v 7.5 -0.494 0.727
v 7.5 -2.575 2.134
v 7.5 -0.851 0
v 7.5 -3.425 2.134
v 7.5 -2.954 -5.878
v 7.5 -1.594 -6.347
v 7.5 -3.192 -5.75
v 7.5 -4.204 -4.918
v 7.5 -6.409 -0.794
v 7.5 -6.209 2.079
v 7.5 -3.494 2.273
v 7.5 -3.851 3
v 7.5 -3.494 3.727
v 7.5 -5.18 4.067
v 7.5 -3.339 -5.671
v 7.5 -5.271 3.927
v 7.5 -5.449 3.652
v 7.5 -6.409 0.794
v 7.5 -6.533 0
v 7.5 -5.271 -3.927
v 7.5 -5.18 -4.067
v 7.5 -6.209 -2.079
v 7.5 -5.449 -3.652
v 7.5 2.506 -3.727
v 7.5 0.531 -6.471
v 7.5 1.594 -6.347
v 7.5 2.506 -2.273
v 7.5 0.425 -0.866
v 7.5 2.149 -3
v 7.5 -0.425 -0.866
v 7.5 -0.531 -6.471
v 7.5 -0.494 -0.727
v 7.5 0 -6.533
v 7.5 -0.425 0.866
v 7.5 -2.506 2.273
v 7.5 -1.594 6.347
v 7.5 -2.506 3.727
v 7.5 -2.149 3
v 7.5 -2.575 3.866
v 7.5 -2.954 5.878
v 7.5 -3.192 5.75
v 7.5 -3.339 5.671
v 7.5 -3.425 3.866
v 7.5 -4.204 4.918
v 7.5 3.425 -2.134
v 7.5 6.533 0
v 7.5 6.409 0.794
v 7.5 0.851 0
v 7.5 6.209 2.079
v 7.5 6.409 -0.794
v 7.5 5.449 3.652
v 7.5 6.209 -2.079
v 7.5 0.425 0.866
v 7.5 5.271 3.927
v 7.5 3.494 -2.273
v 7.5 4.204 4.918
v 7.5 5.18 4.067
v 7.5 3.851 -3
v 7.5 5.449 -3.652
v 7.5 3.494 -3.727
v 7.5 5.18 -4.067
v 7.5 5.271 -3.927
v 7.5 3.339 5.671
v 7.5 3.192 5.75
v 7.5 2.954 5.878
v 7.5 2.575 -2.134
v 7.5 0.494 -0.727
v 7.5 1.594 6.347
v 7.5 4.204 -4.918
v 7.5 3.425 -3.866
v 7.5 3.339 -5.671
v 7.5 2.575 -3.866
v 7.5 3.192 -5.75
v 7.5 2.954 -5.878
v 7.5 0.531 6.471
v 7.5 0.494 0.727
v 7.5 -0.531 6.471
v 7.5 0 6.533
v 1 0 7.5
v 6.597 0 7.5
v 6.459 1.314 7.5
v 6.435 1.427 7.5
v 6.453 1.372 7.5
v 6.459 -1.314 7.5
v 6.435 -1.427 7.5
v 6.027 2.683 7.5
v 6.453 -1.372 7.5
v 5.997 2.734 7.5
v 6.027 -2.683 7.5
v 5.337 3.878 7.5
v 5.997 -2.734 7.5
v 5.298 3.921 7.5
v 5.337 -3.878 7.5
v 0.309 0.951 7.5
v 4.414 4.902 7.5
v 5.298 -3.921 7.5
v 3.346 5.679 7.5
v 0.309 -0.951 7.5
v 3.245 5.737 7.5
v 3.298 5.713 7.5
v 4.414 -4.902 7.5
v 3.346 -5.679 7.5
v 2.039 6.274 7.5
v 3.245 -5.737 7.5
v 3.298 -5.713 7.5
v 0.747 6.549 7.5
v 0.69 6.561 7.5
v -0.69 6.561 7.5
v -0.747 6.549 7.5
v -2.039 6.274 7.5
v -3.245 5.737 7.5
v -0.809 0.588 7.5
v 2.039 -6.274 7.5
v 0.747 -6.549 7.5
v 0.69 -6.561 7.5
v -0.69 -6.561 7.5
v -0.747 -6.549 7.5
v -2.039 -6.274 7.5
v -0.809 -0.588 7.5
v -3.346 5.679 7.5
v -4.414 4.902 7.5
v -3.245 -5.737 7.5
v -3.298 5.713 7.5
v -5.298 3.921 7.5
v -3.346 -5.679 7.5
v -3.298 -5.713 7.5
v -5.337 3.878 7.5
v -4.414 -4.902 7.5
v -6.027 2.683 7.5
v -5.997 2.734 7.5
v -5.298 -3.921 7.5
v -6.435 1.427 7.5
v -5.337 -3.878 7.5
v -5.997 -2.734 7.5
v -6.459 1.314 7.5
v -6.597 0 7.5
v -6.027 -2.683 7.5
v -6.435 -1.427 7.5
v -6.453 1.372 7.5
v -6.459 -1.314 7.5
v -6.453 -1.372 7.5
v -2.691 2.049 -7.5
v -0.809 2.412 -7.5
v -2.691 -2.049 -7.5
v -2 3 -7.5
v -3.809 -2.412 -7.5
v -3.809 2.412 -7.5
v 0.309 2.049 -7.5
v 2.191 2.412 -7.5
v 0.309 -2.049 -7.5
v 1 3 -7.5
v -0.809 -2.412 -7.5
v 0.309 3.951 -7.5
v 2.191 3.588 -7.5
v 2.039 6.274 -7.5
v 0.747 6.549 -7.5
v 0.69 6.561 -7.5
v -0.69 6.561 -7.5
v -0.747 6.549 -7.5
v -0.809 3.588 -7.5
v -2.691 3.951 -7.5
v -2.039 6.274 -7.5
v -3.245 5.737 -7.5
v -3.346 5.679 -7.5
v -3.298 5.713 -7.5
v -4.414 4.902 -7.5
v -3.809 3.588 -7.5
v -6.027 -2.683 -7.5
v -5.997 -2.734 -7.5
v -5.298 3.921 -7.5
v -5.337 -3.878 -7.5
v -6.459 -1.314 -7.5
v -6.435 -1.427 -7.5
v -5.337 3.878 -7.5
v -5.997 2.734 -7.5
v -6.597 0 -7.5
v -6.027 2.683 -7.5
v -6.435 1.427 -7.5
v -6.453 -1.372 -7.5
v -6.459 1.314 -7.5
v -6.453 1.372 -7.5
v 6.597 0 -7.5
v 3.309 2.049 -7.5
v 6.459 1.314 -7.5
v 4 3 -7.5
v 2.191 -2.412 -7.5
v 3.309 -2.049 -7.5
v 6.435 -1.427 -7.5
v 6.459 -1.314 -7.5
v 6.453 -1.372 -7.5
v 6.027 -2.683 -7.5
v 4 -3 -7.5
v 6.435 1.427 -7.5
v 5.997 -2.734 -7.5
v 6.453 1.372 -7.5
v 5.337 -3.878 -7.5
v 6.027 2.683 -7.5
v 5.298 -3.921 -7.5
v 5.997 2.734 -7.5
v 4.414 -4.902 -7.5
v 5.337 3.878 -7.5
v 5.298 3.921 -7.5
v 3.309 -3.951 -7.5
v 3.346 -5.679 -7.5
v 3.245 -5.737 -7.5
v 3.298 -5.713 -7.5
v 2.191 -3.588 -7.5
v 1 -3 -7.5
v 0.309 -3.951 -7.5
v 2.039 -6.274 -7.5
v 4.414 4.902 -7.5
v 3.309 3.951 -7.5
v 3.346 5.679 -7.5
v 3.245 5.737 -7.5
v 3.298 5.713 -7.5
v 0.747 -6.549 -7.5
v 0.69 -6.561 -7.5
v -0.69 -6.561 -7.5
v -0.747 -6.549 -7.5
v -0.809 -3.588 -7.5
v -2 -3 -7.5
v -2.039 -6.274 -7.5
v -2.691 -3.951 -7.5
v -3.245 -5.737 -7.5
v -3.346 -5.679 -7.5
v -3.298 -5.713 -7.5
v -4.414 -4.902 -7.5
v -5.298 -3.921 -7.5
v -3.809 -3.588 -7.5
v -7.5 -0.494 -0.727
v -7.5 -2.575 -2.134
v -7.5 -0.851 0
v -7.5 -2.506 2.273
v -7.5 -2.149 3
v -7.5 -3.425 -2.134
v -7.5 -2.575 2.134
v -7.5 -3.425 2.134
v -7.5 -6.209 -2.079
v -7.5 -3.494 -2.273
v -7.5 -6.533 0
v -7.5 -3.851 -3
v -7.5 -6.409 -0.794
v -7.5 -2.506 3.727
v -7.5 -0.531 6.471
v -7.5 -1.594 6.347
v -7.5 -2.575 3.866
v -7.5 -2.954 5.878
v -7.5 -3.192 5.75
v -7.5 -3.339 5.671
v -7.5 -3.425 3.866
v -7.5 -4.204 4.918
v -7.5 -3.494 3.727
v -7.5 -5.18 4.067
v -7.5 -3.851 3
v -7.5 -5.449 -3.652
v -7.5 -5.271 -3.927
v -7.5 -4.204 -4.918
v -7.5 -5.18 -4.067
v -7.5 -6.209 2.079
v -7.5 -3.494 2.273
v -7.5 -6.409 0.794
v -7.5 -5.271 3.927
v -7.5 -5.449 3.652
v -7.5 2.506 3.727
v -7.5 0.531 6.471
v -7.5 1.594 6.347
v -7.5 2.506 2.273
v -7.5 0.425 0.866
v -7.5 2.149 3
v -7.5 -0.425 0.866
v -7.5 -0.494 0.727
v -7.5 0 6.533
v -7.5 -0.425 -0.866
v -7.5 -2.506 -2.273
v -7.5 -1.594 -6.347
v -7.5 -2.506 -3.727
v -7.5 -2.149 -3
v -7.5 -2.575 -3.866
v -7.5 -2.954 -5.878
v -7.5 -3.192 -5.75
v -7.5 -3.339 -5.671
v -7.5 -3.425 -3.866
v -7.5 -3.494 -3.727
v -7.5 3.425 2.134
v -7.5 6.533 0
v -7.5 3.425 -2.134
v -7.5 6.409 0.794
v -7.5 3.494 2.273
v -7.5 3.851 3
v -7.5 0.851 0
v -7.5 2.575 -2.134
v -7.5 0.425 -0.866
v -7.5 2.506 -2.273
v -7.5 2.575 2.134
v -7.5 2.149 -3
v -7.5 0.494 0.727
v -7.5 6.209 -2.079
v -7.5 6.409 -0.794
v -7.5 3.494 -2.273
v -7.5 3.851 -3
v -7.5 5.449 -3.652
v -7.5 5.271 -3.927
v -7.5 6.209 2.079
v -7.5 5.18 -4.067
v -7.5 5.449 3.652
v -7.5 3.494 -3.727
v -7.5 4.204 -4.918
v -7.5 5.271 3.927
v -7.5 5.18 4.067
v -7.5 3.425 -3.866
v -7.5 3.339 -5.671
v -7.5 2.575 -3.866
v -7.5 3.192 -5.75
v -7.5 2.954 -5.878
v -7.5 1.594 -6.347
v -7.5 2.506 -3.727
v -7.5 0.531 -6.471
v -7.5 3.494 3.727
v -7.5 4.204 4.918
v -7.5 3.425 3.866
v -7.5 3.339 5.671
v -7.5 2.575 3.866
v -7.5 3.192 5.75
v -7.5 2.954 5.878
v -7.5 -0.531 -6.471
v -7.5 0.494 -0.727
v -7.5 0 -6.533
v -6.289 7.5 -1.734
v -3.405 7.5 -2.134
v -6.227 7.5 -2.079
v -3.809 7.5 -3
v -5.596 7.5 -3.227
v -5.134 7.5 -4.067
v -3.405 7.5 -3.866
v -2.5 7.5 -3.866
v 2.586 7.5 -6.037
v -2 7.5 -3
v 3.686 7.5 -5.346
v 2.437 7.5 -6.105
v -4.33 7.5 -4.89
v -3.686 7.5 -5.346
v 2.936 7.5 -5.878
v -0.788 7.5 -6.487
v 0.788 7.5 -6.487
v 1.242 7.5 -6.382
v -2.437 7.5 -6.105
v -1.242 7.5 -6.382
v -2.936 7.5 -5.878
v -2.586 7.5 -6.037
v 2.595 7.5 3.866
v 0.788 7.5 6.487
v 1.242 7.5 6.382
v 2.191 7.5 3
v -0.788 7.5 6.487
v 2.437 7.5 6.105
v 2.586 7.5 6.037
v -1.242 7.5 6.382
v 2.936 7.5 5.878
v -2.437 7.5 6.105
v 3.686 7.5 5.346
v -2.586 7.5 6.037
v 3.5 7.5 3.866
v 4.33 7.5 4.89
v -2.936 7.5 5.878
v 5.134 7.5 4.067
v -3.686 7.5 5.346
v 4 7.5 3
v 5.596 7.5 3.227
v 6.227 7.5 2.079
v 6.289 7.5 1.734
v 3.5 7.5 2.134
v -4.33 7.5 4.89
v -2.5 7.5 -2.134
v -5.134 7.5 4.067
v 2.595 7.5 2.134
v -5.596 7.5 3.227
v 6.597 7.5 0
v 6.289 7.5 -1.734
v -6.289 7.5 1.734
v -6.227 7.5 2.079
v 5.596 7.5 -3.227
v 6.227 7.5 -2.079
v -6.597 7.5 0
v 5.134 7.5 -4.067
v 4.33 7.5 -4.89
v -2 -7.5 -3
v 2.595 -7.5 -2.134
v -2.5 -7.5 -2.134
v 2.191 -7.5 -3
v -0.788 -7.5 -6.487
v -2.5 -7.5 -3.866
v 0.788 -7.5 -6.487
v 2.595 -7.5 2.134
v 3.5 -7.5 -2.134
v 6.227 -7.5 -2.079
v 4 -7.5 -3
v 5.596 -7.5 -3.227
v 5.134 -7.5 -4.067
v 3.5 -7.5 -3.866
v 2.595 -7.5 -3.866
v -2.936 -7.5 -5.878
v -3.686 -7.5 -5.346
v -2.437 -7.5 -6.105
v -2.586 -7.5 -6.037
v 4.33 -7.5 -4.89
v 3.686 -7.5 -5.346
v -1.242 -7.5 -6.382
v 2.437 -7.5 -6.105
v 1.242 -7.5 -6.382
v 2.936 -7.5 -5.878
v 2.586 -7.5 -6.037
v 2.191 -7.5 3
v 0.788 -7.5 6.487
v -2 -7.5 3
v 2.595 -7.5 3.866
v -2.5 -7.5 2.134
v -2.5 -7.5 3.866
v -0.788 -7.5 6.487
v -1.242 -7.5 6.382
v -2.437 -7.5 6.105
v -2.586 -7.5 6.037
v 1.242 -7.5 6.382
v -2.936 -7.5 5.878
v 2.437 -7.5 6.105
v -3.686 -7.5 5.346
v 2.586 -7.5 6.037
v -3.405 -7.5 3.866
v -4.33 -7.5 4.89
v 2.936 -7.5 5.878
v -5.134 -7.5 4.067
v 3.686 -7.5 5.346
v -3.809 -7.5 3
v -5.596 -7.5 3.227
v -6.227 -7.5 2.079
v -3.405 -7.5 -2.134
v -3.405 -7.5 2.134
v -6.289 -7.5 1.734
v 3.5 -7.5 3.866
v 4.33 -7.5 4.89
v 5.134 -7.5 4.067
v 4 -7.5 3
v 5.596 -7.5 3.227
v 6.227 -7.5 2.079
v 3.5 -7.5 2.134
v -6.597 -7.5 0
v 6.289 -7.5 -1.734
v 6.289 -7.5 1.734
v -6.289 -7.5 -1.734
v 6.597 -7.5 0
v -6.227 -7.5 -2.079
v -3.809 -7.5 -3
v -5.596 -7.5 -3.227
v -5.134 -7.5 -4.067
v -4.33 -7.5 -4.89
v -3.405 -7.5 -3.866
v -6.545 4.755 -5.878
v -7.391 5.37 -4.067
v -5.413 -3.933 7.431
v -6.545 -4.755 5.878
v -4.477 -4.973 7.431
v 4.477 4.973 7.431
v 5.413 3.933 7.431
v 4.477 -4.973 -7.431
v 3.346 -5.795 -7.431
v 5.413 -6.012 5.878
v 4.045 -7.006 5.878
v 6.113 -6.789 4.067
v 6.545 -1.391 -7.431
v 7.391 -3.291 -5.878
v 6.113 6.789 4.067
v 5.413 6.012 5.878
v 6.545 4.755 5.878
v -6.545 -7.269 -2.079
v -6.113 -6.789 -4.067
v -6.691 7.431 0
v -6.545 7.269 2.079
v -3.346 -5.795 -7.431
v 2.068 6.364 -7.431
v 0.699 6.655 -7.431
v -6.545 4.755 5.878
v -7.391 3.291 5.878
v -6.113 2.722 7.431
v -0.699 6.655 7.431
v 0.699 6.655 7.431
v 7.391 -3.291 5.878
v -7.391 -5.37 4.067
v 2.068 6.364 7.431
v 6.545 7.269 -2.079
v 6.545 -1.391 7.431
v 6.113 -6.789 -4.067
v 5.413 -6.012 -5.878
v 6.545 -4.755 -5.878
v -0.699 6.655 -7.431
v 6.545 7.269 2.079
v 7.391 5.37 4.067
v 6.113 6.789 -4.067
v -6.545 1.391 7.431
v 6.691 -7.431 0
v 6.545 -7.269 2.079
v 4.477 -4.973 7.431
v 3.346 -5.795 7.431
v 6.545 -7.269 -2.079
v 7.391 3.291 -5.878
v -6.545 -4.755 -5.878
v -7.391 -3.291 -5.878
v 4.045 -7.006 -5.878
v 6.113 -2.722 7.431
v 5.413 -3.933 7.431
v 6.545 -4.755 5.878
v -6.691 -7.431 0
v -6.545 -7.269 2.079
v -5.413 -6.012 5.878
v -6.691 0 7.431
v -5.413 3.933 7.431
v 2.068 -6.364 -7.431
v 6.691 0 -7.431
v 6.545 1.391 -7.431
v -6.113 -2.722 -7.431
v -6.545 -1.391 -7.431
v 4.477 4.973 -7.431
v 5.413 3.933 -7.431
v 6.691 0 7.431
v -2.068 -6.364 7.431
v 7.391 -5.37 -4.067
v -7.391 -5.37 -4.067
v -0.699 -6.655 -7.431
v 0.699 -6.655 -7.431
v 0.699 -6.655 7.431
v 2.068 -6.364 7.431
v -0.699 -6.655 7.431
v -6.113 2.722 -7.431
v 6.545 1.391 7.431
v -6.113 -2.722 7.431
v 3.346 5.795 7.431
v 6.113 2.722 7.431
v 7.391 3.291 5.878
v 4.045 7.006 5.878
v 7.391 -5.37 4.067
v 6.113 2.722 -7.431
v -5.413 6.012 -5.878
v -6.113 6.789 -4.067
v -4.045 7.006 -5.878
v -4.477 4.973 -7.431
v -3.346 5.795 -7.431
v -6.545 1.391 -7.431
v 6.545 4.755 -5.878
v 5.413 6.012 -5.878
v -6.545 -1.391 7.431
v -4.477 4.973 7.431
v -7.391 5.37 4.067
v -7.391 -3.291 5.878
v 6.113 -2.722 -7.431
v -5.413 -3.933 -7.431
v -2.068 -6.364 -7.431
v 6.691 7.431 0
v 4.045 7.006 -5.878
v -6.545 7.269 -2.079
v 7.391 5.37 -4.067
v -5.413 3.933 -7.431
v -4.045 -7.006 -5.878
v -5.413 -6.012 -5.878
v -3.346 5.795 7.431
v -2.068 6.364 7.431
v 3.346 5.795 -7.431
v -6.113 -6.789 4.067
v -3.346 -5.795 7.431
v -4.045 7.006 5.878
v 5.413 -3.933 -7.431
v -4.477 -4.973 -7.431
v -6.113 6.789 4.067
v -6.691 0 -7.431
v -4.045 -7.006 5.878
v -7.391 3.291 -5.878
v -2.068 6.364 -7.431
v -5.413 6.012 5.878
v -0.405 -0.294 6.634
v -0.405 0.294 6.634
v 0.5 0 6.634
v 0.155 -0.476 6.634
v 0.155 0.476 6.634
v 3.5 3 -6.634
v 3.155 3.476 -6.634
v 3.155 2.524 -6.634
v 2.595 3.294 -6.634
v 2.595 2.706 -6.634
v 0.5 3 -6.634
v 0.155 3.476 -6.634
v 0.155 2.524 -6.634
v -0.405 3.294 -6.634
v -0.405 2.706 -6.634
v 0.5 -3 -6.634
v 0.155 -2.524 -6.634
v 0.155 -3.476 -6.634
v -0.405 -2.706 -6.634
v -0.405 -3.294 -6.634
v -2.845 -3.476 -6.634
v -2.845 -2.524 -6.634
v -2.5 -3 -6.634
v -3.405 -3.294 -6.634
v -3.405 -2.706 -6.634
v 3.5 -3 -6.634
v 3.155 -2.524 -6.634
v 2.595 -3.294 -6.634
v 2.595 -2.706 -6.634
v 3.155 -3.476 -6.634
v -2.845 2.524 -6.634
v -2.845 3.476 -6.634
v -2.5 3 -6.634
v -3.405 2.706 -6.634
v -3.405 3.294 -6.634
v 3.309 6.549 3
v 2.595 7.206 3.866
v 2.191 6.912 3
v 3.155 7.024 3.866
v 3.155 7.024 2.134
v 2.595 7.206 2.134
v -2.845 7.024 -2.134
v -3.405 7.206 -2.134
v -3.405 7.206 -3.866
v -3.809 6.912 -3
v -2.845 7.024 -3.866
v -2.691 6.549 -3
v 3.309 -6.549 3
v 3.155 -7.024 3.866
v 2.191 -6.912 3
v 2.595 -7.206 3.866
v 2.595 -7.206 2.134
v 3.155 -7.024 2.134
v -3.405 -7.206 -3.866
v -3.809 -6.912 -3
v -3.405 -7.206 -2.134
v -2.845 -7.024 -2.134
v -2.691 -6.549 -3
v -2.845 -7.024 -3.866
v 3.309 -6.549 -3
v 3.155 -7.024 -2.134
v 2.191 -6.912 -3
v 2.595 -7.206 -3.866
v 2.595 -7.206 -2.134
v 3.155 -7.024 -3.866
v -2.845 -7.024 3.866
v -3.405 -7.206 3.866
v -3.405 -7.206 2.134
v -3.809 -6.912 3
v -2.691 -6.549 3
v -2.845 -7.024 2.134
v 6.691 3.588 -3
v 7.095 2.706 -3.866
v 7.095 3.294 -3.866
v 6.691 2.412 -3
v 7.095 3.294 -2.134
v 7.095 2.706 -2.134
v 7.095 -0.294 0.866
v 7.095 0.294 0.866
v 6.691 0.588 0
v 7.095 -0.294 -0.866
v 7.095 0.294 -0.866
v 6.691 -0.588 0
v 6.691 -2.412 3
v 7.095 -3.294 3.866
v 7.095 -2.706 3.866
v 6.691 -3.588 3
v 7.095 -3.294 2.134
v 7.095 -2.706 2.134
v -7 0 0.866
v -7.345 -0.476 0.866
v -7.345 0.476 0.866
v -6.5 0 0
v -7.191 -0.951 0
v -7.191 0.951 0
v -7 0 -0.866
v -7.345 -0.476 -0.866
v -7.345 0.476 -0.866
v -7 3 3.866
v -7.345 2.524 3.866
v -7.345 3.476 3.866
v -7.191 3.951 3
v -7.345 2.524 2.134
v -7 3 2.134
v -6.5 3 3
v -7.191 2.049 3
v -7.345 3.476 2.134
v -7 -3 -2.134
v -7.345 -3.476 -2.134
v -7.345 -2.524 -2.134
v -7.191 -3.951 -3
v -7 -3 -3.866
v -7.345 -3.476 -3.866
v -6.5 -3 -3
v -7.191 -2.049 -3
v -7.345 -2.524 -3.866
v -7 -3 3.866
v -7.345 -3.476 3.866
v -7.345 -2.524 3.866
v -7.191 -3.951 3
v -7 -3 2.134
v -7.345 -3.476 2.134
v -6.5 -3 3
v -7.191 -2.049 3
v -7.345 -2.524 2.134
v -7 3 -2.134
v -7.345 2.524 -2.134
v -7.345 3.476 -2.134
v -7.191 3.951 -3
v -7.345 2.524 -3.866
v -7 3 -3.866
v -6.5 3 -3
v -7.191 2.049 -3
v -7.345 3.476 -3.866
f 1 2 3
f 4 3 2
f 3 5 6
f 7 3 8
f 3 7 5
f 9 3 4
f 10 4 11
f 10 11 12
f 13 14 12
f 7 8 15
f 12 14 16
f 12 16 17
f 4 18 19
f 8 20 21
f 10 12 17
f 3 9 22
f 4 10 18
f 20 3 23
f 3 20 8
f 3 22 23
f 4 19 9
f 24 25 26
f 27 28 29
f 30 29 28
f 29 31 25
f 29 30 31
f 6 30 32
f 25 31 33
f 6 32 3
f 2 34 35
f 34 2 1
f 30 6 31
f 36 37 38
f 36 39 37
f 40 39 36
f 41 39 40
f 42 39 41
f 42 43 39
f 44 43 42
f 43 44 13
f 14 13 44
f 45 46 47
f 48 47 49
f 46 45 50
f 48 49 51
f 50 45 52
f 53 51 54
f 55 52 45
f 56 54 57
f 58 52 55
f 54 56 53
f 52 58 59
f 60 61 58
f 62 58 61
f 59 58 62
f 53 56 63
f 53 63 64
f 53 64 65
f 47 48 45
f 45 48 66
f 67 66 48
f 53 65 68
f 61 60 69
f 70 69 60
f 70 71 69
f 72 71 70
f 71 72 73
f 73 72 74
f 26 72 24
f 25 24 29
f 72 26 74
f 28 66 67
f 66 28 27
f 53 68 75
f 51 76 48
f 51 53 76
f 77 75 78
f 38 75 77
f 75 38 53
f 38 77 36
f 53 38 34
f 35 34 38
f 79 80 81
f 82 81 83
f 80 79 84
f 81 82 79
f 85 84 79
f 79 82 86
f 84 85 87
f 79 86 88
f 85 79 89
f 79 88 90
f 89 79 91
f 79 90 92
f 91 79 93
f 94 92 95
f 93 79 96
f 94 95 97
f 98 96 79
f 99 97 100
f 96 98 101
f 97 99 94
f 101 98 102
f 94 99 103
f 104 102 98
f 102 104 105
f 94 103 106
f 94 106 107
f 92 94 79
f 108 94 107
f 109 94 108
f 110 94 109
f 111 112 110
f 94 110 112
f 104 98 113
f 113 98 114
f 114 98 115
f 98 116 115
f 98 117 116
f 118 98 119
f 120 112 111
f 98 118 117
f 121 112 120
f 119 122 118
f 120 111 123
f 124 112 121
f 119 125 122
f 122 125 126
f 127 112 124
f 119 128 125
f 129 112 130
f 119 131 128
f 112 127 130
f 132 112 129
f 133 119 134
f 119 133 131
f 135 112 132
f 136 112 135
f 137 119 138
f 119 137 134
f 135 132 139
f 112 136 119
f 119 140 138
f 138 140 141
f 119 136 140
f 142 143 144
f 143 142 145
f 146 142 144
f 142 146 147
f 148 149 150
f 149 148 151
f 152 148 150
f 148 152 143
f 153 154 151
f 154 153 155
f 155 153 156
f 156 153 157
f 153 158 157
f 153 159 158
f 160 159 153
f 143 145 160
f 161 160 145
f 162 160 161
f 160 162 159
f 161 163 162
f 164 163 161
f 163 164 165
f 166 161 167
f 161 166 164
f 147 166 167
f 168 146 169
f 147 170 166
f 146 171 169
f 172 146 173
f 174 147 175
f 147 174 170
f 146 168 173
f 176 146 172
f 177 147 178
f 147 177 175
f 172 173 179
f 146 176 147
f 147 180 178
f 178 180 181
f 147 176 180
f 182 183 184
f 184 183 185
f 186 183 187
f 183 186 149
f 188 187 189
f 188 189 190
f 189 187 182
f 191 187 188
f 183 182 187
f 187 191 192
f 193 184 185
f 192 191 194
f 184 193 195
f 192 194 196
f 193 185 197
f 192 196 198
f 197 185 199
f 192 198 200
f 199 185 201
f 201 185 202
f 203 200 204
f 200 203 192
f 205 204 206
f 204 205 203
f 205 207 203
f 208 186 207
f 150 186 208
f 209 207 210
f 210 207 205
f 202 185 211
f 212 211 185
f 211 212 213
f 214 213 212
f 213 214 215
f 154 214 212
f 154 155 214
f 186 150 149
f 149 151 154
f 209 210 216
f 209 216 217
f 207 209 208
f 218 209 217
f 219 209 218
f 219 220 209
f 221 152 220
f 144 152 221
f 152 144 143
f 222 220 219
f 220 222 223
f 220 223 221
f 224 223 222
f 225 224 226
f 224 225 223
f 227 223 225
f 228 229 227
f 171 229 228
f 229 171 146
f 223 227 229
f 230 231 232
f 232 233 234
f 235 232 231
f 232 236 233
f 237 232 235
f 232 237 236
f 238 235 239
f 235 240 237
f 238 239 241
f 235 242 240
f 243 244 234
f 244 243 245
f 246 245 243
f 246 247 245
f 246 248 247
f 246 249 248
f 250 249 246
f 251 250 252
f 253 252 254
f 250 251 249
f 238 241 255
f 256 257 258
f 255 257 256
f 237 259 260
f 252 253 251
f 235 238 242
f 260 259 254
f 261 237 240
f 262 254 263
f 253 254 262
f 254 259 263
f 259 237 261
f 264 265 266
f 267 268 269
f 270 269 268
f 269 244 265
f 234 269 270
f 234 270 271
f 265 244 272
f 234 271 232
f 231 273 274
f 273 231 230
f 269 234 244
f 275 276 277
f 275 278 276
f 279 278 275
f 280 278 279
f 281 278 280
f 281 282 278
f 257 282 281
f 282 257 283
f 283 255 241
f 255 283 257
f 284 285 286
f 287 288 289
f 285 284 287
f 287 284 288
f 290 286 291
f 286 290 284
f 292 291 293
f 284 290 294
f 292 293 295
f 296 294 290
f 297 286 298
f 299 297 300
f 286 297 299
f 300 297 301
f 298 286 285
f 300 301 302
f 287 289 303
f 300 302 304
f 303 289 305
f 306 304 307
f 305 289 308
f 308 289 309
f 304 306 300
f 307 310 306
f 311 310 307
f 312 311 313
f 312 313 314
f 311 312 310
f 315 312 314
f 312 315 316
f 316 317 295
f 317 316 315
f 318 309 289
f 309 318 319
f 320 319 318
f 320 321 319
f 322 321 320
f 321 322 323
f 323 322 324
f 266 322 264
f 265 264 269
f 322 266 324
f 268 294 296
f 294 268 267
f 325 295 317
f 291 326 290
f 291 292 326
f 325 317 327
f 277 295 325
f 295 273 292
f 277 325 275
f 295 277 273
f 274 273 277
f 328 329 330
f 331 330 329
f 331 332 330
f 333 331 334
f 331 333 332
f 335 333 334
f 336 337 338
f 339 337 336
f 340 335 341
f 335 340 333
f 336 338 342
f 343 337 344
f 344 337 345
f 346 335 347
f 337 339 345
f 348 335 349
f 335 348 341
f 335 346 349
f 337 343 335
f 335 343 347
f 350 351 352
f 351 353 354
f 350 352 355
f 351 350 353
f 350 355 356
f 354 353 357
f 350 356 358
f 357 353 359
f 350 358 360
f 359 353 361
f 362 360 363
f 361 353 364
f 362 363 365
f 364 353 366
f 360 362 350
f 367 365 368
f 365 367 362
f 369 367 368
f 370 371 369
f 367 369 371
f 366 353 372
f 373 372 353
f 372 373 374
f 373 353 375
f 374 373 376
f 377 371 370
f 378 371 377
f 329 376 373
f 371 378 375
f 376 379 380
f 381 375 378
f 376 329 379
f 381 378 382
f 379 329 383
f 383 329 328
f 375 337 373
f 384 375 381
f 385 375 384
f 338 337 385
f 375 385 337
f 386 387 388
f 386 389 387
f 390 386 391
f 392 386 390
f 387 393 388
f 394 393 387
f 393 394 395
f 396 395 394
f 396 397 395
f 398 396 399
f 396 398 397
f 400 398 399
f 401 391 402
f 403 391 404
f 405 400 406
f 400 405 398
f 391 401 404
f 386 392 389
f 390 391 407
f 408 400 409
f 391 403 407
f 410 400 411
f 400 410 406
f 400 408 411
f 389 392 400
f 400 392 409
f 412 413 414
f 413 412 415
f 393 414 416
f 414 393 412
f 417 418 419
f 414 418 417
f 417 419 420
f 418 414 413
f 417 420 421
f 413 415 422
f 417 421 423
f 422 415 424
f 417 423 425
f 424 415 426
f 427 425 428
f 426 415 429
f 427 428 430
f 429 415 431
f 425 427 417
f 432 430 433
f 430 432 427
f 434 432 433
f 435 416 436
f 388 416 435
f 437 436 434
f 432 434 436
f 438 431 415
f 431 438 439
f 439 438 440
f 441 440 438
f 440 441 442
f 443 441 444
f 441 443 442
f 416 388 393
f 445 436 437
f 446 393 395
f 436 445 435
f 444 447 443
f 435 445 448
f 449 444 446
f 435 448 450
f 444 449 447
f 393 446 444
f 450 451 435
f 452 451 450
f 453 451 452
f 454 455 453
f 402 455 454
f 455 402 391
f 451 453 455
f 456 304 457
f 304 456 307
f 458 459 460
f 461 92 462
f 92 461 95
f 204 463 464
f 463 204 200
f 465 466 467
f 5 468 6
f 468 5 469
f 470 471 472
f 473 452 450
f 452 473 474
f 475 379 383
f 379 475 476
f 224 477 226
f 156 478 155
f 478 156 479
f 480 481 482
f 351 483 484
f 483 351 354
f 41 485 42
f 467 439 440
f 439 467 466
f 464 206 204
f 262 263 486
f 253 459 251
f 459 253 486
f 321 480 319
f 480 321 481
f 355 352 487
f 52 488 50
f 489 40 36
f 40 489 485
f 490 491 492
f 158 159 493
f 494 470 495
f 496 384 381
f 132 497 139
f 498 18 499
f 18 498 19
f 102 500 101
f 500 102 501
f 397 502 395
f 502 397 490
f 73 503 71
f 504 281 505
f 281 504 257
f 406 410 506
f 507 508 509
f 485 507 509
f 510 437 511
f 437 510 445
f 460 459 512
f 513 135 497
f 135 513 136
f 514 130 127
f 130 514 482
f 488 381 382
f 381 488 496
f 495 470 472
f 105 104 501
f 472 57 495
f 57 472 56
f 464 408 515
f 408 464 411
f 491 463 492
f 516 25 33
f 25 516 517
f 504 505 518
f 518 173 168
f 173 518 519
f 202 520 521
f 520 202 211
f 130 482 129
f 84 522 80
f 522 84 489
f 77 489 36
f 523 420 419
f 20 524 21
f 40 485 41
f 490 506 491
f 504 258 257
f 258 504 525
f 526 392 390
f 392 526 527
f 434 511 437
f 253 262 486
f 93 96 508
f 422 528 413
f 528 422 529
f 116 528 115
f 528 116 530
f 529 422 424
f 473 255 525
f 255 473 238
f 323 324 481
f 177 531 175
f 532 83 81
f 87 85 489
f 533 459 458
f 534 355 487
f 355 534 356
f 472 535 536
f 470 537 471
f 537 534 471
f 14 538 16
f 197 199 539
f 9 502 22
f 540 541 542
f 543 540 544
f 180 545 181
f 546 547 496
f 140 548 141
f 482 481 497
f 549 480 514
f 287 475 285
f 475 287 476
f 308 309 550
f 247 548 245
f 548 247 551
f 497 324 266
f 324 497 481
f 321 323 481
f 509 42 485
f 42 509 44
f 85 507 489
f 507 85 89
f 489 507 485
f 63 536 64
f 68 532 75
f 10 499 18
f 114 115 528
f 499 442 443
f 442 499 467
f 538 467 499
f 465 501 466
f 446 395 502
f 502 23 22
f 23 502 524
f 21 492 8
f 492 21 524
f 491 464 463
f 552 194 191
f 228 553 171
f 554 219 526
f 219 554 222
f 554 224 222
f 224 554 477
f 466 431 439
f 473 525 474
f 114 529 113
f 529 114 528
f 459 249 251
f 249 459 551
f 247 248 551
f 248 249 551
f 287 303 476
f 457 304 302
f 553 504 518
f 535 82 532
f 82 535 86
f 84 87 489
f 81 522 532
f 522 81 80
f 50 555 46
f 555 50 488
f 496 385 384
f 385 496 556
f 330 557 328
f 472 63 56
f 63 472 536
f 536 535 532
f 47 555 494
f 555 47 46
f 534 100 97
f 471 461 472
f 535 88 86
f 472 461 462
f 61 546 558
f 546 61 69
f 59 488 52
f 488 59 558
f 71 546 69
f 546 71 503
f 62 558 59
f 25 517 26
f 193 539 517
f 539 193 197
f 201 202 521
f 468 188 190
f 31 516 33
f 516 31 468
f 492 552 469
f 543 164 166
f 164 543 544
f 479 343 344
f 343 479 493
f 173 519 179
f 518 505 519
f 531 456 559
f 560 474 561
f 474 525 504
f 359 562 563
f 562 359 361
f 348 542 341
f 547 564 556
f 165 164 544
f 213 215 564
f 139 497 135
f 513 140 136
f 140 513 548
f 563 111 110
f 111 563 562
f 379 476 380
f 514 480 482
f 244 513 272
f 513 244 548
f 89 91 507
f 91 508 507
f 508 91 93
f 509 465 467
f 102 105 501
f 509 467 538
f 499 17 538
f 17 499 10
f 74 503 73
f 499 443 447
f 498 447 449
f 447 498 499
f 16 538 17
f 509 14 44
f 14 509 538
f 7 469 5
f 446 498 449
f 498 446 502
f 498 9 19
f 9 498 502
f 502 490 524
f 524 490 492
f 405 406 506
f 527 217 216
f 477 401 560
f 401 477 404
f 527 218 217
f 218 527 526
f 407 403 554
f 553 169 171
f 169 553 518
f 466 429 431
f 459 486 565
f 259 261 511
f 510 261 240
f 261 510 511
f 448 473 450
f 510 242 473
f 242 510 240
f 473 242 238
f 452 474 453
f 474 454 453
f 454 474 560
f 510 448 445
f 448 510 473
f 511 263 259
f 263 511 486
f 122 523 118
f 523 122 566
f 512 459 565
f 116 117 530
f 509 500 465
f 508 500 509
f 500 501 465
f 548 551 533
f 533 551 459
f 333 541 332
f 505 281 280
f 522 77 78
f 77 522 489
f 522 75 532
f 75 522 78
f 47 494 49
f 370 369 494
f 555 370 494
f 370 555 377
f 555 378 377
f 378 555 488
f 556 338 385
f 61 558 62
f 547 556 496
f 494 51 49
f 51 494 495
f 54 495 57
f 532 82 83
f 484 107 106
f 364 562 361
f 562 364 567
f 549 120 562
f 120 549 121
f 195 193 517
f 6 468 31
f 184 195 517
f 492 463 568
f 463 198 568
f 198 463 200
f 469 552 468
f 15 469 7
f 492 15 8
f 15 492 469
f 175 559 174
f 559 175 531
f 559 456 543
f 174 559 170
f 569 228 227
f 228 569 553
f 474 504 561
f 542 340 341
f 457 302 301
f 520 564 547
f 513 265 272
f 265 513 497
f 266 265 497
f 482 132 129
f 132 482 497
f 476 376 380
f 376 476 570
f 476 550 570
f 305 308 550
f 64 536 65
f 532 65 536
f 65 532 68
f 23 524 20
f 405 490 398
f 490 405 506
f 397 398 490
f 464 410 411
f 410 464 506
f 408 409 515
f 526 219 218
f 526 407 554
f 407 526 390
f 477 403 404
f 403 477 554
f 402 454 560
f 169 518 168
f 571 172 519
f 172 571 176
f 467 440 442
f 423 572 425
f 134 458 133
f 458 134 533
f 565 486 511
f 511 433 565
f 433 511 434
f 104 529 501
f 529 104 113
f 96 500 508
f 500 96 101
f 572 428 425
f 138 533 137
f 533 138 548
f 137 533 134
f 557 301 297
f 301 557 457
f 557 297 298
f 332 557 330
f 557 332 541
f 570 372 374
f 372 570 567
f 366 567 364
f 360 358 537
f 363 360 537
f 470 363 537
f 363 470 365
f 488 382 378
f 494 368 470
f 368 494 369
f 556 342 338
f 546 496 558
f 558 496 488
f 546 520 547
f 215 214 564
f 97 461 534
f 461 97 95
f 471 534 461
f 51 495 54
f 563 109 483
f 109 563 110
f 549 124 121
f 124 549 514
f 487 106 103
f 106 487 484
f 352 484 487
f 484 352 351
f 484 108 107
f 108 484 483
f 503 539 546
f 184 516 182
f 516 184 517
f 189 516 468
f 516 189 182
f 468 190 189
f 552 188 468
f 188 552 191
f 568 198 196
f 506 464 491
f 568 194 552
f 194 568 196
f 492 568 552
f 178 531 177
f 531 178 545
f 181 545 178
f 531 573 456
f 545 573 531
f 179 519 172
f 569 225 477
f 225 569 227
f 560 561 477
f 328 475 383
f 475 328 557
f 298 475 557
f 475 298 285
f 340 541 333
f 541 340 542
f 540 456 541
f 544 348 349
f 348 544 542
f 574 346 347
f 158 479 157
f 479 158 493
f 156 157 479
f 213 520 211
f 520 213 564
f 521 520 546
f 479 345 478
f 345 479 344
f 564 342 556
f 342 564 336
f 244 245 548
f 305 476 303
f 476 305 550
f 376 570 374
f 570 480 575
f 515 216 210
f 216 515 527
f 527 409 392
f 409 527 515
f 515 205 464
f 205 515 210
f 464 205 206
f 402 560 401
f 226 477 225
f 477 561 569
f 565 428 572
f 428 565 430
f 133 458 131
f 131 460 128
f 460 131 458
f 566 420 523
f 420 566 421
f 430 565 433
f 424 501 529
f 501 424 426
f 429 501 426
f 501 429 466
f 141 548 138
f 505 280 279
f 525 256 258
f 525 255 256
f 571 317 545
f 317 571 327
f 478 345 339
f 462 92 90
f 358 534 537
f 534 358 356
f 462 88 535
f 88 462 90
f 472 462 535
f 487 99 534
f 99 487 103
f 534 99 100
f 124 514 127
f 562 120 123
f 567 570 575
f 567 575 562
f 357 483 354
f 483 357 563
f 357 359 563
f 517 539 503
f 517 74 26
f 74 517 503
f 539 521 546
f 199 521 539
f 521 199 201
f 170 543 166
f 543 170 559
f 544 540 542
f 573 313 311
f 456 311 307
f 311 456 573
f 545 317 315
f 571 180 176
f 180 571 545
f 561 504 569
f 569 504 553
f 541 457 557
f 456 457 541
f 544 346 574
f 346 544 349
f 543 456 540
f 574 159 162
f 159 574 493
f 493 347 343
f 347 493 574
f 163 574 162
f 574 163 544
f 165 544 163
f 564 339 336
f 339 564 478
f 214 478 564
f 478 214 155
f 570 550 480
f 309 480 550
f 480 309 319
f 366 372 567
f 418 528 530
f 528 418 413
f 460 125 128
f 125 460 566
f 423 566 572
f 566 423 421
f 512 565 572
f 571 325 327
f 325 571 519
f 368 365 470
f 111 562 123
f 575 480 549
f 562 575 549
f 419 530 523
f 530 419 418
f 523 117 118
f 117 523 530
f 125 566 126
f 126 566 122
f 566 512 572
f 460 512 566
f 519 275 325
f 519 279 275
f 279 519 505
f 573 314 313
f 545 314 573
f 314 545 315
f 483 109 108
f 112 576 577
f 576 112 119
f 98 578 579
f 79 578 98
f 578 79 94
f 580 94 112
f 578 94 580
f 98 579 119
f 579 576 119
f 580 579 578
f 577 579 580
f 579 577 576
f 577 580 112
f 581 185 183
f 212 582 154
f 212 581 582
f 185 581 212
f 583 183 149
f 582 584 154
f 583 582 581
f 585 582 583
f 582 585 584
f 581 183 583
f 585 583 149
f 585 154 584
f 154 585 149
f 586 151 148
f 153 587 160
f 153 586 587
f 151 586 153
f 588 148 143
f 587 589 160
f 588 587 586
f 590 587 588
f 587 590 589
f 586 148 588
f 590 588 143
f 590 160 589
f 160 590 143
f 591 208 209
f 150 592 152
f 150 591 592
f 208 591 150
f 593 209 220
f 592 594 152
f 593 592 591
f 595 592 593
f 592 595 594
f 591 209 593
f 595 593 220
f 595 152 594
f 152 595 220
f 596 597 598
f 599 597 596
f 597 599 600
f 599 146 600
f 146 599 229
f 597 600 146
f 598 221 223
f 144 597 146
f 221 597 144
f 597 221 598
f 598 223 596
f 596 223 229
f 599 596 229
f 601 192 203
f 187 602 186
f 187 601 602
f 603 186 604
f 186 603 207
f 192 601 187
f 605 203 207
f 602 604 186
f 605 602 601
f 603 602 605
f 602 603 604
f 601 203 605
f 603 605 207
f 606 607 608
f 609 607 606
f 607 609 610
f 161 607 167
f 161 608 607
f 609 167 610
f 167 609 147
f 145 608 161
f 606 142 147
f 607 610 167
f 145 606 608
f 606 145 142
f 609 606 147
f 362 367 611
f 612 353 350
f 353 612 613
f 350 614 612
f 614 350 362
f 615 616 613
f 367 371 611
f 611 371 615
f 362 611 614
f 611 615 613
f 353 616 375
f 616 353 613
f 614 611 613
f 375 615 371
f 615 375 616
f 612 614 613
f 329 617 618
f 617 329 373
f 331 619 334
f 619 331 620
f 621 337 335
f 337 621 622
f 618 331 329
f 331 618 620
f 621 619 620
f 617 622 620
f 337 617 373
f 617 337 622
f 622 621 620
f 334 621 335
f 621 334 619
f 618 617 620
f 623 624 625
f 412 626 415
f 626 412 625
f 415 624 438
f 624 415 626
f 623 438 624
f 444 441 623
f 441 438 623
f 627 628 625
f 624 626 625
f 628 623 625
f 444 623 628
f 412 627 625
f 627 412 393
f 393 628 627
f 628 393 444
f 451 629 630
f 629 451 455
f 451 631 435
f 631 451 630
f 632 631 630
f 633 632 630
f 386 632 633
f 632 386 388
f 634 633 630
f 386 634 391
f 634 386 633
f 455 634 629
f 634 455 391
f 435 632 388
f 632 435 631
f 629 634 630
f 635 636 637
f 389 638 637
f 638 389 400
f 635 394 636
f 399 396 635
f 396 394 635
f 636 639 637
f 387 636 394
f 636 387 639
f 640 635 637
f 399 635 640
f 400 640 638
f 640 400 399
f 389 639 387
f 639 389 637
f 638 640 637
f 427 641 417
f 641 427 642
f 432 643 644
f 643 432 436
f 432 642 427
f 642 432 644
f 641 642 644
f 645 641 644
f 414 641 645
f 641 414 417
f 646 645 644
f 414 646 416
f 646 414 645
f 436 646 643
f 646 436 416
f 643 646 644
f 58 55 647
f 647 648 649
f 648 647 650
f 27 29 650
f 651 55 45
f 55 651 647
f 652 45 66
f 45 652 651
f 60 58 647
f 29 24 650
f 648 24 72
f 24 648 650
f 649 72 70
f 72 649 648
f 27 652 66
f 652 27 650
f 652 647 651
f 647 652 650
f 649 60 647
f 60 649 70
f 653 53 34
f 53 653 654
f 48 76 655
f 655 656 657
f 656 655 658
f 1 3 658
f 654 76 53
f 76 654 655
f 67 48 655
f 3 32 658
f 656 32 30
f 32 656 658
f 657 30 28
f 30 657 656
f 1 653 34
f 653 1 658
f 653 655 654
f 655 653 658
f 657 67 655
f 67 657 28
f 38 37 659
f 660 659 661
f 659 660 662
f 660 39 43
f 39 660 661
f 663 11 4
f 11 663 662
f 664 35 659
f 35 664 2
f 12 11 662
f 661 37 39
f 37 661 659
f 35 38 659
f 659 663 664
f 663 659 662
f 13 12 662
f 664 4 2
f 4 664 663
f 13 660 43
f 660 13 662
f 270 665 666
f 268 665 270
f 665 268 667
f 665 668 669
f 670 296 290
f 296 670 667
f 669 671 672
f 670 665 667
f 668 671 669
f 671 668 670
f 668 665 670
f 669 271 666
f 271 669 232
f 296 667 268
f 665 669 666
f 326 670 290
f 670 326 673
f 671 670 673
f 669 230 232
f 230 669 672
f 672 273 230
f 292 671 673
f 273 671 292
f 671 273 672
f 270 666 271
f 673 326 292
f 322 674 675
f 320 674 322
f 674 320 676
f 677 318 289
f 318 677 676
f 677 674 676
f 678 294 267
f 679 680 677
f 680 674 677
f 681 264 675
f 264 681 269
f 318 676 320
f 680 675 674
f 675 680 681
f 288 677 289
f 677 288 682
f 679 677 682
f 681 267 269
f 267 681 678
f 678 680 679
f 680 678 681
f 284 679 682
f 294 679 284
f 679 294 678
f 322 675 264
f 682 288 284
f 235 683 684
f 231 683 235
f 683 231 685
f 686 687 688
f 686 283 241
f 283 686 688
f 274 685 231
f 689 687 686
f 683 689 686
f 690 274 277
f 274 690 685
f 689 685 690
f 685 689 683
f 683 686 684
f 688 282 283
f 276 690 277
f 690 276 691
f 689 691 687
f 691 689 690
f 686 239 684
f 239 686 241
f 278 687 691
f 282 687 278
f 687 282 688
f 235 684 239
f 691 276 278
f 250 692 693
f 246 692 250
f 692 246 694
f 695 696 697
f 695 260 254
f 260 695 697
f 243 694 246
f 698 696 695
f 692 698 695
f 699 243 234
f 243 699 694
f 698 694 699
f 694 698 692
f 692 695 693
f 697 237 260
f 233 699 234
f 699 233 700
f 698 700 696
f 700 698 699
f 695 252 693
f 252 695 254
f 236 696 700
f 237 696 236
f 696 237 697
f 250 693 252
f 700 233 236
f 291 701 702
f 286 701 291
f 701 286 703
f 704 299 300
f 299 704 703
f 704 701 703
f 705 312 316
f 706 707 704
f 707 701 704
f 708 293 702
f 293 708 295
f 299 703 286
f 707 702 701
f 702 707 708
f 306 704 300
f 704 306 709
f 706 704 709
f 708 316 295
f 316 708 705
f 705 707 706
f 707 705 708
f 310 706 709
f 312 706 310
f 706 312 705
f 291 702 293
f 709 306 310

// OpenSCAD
// dice.scad

difference () {
    // dice with rounded corners
    intersection() {
        cube(15, center=true);
        sphere(10);
    }

    //one
    translate([0, 0, 7.5]) sphere(1);

    //six
    translate([ 3,  3, -7.5]) sphere(1);
    translate([ 0,  3, -7.5]) sphere(1);
    translate([ 0, -3, -7.5]) sphere(1);
    translate([-3, -3, -7.5]) sphere(1);
    translate([ 3, -3, -7.5]) sphere(1);
    translate([-3,  3, -7.5]) sphere(1);
    
    //two
    translate([ 3, 7.5,  3]) sphere(1);
    translate([-3, 7.5, -3]) sphere(1);

    //four
    translate([ 3, -7.5,  3]) sphere(1);
    translate([-3, -7.5, -3]) sphere(1);
    translate([ 3, -7.5, -3]) sphere(1);
    translate([-3, -7.5,  3]) sphere(1);

    //three
    translate([7.5,  3, -3]) sphere(1);
    translate([7.5,  0,  0]) sphere(1);
    translate([7.5, -3,  3]) sphere(1);
    
    //Five
    translate([-7.5,  0,  0]) sphere(1);
    translate([-7.5,  3,  3]) sphere(1);
    translate([-7.5, -3, -3]) sphere(1);
    translate([-7.5, -3,  3]) sphere(1);
    translate([-7.5,  3, -3]) sphere(1);

}

echo(version=version());
